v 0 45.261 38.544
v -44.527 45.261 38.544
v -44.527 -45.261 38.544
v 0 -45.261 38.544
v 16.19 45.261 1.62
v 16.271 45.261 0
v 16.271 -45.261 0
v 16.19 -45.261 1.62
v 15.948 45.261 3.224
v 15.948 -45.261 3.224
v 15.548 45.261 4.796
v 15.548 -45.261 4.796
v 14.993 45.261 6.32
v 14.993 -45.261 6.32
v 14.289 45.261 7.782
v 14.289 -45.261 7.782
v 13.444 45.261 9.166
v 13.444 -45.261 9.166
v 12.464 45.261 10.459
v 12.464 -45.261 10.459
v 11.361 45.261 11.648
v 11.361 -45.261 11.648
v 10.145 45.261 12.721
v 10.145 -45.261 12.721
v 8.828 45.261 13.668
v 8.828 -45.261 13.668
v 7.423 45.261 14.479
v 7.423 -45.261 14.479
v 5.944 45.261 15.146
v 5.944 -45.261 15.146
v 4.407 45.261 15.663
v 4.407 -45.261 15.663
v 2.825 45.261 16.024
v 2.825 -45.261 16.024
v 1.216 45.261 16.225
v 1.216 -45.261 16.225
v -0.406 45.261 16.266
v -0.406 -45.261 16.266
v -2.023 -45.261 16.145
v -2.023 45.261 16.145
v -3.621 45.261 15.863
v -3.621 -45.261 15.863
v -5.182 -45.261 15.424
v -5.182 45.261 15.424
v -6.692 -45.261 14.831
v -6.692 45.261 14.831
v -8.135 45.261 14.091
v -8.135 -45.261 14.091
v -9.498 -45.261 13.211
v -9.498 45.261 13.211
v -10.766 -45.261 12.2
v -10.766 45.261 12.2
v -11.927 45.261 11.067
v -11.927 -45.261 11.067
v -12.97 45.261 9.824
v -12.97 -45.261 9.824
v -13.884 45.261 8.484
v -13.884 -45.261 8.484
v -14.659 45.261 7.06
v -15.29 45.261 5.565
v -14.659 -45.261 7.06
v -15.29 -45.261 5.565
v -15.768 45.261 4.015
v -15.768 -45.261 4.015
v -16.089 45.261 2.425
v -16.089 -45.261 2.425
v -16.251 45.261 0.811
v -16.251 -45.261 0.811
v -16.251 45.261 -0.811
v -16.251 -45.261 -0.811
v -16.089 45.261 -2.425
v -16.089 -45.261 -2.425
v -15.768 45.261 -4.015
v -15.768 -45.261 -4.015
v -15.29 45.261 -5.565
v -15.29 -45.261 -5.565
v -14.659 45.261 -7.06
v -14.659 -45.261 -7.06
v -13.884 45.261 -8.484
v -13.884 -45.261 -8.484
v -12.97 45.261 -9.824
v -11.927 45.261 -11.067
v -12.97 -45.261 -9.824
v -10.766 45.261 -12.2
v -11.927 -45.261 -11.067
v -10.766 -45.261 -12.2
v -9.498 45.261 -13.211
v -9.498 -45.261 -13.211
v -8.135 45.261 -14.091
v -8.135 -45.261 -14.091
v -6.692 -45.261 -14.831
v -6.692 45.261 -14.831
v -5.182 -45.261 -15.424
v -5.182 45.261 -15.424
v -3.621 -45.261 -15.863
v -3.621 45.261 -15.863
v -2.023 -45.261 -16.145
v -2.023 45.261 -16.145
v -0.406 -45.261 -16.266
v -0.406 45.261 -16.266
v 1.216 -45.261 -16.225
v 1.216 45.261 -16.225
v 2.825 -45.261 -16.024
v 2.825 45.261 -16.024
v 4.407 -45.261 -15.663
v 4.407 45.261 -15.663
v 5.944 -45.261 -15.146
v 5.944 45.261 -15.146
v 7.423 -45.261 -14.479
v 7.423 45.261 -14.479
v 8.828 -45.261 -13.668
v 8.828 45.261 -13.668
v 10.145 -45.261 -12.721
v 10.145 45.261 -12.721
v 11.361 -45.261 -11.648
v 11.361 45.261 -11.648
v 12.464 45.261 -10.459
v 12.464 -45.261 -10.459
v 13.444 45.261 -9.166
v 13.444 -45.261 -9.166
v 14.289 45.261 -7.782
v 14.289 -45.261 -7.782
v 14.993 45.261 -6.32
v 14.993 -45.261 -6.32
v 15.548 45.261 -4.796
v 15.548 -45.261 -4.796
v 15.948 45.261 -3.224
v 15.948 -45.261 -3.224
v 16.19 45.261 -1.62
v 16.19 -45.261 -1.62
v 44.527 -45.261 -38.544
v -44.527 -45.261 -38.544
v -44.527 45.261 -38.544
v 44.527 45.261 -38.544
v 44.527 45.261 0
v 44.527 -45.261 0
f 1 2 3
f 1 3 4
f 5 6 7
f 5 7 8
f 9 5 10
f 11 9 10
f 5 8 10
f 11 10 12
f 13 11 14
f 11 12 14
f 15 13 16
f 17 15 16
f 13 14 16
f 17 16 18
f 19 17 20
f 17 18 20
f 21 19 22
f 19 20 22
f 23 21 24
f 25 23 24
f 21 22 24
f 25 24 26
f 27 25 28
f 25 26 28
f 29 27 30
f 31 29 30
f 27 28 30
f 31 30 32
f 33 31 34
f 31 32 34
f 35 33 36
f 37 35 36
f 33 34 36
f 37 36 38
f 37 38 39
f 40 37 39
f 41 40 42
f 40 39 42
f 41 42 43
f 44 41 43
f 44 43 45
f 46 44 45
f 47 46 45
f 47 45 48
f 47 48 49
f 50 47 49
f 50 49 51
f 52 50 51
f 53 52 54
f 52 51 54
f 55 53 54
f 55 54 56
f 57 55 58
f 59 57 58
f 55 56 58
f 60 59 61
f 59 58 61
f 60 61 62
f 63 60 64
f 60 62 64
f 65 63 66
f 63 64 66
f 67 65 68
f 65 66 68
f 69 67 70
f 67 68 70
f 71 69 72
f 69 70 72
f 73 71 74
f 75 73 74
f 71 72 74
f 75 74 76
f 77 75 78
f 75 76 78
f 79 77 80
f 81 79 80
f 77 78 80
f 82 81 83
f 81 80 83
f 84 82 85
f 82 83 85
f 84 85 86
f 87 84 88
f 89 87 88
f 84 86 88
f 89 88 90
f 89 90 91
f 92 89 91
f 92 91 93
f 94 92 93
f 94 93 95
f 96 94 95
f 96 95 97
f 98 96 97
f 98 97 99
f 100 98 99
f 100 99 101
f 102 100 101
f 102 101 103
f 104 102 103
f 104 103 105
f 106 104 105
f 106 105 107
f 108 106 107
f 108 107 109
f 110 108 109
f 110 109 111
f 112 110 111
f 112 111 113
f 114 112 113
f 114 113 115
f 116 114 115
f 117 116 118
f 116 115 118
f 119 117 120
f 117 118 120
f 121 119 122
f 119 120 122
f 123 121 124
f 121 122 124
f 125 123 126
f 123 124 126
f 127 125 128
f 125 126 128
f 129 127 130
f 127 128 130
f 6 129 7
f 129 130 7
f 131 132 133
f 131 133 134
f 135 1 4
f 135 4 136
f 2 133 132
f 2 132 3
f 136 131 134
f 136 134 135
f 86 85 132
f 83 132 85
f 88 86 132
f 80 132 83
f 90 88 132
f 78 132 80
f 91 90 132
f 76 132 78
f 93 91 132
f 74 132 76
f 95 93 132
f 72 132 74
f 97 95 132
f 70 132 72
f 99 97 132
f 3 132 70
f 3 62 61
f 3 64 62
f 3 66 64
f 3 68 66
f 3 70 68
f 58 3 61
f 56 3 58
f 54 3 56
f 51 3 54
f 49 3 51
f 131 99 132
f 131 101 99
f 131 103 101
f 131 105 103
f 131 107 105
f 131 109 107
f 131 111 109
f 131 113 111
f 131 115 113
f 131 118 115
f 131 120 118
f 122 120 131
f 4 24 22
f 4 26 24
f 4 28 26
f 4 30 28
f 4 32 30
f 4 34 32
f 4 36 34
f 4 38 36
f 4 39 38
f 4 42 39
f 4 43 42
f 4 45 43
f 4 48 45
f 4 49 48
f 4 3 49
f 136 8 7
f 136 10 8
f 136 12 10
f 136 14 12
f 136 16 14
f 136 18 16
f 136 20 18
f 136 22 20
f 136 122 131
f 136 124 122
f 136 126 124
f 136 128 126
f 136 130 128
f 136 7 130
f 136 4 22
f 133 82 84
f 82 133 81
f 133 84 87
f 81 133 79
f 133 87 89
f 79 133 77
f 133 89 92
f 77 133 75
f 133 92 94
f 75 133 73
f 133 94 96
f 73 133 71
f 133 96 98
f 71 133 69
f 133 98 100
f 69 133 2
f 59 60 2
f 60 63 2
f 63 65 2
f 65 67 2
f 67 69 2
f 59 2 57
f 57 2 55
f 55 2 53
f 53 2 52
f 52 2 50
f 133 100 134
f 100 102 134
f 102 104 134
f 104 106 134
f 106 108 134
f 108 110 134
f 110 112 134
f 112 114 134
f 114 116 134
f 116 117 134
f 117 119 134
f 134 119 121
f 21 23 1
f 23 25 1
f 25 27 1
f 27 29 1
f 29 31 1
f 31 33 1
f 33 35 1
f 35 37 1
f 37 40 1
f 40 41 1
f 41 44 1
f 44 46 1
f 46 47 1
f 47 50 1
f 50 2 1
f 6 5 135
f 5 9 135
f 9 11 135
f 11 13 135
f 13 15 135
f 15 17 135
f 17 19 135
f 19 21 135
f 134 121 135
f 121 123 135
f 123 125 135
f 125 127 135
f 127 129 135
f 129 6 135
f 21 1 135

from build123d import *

# Parameters (mm, degrees)
F0_W     = 89.054606
F0_H     = 77.087894
F1_DEPTH = 45.2606
F3_DEPTH = 90.5222
F4_R     = 16.270779
F5_DEPTH = 46.09548


with BuildPart() as f1:
    # F0 (on Front) → F1 (new body, symmetric)
    with BuildSketch(Plane.XZ):
        Rectangle(F0_W, F0_H)
    extrude(amount=F1_DEPTH, both=True)

    # F2 (on face) → F3 (cut, through all)
    with BuildSketch(Plane.XZ.offset(45.2606)):
        Polygon((44.527303, 38.543947), (0, 38.543947), (44.527303, 0), align=None)
    extrude(amount=-F3_DEPTH, mode=Mode.SUBTRACT)

    # F4 (on Front) → F5 (cut, symmetric)
    with BuildSketch(Plane.XZ):
        Circle(F4_R)
    extrude(amount=F5_DEPTH, both=True, mode=Mode.SUBTRACT)


solid = f1.part
